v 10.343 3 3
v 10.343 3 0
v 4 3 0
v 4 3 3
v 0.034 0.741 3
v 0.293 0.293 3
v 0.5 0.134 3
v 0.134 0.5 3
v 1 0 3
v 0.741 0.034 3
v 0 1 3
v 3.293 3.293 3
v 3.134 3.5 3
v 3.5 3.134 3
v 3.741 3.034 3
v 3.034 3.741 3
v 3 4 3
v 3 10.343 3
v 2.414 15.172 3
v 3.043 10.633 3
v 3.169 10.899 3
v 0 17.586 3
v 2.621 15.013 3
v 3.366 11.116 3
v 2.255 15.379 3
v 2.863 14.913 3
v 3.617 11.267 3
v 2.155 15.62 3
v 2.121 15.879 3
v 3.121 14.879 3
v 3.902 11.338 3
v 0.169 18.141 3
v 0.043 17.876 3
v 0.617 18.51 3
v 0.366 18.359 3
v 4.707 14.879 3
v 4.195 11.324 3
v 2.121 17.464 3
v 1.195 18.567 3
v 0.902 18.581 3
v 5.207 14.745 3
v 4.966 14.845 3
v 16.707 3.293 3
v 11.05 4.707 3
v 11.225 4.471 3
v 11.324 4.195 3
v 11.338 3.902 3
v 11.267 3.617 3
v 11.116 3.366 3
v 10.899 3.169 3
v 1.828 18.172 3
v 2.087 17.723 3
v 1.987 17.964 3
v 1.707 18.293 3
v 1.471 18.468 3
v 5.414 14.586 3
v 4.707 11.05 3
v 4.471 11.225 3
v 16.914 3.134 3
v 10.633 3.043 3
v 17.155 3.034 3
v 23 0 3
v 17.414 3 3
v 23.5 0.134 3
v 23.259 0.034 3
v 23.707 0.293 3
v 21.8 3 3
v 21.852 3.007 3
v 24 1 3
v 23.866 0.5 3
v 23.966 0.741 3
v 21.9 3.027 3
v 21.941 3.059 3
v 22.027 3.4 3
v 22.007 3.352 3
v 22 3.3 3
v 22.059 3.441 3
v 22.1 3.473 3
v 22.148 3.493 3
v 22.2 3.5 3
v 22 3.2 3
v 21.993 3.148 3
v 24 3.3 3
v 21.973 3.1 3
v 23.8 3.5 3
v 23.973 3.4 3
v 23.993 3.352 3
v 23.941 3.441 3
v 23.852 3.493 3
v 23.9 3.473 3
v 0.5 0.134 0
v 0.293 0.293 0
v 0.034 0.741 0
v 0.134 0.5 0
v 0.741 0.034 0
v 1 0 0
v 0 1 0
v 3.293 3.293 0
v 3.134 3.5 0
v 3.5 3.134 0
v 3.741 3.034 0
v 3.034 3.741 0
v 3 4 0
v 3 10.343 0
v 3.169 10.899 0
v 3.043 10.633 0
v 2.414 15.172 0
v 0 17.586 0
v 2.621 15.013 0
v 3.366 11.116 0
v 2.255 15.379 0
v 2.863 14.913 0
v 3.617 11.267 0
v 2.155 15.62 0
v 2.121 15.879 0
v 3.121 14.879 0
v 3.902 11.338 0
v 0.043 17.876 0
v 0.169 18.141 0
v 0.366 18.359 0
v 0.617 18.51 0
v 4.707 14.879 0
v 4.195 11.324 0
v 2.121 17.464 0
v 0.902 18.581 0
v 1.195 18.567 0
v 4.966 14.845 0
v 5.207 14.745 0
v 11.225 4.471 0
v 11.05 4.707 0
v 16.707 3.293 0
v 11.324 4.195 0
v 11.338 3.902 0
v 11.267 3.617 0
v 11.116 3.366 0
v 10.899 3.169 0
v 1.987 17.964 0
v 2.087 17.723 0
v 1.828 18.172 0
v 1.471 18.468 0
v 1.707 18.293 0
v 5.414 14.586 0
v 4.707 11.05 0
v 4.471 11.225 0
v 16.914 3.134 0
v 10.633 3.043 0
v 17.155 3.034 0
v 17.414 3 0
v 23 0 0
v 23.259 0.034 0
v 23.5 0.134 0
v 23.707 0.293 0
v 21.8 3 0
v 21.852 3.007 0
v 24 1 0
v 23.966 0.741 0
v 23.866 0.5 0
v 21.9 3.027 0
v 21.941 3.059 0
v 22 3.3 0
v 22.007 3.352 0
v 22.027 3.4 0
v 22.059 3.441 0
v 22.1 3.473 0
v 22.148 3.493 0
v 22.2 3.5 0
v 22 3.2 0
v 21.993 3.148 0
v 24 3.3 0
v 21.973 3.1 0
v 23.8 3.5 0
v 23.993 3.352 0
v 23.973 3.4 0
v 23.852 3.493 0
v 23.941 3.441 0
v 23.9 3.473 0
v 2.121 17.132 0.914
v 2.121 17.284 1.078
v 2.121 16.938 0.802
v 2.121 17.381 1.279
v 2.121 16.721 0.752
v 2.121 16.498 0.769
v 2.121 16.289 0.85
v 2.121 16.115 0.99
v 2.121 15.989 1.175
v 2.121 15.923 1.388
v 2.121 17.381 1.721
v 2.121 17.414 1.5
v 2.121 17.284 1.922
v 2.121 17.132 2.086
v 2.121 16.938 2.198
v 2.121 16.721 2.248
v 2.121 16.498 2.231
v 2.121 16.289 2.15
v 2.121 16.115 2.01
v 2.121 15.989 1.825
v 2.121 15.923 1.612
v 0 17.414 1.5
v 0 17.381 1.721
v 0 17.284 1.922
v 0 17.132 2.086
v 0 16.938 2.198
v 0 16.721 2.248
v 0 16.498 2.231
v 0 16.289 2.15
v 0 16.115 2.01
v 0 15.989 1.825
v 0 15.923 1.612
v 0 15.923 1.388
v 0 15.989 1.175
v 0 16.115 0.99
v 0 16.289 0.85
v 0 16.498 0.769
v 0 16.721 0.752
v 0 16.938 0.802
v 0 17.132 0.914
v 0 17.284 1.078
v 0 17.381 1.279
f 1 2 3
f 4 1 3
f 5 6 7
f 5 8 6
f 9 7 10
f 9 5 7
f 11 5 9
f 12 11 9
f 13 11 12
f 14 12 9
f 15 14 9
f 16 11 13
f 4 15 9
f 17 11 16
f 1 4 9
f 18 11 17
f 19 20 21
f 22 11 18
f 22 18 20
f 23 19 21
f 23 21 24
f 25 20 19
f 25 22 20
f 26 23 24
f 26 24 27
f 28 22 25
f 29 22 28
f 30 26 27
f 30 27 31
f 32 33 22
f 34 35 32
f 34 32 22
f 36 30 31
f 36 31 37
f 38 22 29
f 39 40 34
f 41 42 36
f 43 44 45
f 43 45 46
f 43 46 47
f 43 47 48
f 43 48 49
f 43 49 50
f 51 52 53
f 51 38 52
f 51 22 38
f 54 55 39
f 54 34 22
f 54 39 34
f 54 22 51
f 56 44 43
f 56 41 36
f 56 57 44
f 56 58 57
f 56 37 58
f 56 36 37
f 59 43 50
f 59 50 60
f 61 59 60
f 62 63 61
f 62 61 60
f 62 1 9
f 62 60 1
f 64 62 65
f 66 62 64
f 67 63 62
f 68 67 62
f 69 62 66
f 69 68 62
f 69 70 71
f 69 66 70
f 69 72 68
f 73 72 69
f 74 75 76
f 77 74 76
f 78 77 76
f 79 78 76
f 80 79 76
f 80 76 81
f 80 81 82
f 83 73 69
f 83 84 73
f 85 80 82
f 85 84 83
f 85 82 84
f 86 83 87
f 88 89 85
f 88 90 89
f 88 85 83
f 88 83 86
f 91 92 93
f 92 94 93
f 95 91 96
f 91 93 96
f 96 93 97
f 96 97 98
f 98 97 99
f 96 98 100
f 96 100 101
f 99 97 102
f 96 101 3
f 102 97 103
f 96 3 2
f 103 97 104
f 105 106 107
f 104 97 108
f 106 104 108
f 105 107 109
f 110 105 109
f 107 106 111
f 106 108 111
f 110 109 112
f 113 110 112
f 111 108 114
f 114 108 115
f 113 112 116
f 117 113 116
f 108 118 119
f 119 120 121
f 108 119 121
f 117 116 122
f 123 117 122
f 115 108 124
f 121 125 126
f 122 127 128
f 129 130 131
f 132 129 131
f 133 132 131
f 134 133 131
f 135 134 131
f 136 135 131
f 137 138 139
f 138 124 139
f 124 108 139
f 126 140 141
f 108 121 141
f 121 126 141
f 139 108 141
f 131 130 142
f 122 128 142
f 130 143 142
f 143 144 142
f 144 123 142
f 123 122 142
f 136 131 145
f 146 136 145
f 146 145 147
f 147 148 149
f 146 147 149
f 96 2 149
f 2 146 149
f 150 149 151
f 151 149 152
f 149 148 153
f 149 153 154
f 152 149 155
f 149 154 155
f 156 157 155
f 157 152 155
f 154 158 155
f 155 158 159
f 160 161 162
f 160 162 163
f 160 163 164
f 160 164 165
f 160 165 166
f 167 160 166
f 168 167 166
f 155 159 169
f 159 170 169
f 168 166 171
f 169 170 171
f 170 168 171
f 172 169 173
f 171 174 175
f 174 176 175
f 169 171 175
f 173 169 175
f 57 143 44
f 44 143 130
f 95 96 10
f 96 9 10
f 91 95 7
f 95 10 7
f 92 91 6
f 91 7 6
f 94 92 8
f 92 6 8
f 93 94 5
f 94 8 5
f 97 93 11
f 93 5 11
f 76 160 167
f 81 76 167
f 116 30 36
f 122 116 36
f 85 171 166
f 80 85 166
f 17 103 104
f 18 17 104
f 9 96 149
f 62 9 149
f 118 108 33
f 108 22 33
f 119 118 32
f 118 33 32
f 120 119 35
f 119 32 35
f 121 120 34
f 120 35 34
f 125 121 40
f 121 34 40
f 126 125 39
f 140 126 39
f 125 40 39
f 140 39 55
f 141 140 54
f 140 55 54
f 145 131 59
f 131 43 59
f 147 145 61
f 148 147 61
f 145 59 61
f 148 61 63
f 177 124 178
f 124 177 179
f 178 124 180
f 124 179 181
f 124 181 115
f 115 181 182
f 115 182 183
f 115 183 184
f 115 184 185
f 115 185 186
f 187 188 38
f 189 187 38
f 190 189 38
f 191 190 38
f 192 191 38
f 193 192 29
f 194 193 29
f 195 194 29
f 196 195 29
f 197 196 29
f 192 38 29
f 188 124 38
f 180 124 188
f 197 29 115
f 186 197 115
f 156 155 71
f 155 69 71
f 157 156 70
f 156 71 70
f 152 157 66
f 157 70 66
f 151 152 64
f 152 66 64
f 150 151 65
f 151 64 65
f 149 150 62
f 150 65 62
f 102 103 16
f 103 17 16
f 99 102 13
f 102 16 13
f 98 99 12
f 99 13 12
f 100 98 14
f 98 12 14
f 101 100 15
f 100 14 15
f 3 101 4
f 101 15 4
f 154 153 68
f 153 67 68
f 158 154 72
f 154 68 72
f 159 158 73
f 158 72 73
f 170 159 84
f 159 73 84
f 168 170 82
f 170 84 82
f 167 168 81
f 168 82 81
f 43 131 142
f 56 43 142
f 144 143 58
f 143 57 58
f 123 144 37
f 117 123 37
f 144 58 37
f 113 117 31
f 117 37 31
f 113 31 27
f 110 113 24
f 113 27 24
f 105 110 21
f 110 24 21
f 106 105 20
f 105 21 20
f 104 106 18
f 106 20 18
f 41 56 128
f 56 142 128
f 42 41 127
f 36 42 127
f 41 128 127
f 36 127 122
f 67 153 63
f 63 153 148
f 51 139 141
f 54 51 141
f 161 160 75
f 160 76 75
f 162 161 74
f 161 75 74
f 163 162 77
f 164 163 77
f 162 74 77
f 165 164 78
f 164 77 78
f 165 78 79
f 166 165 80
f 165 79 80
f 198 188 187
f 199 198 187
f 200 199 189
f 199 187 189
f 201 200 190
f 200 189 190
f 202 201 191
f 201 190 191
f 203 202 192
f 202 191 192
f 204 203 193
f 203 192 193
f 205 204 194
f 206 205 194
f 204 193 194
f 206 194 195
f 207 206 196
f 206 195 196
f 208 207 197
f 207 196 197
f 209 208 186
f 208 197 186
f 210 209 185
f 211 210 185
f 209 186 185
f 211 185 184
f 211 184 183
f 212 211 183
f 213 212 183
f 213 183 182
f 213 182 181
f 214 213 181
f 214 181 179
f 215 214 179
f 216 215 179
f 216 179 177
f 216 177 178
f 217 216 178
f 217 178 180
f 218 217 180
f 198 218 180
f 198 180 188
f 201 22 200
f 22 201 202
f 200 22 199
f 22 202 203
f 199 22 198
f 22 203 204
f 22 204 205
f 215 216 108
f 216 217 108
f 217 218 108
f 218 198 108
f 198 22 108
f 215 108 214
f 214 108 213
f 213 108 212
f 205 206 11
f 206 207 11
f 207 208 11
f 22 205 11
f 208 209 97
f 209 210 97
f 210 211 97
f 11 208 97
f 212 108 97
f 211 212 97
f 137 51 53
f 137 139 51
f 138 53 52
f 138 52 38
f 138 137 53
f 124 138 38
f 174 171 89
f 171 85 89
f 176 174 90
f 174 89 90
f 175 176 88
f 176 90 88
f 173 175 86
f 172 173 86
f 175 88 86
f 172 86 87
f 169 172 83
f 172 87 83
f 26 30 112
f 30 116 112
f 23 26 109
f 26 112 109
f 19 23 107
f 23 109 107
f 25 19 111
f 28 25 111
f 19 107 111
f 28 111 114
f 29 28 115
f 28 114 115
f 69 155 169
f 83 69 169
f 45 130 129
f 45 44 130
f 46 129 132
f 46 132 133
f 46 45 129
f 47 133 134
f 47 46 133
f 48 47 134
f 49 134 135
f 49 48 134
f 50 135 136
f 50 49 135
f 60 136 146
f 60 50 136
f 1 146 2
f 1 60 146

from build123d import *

# Parameters (mm, degrees)
F1_DEPTH = 3
F3_DEPTH = 3.001
F4_R     = 1
F5_R     = 0.2
F6_R     = 0.75
F7_DEPTH = 2.1223203436


with BuildPart() as f1:
    # F0 (on Top) → F1 (new body)
    with BuildSketch(Plane.XY):
        Polygon((17, 3), (0, 20), (0, 0), (24, 0), (24, 3.5), (22, 3.5), (22, 3), align=None)
        Polygon((12.7573593129, 3), (3, 3), (3, 12.7573593129), align=None, mode=Mode.SUBTRACT)
    extrude(amount=F1_DEPTH)

    # F2 (on face) → F3 (cut, through all)
    with BuildSketch(Plane.XY.offset(3)):
        Polygon((5.1213203436, 17.8786796564), (2.1213203436, 17.8786796564), (5.1213203436, 14.8786796564), align=None)
        Polygon((5.1213203436, 14.8786796564), (2.1213203436, 17.8786796564), (2.1213203436, 14.8786796564), align=None)
    extrude(amount=-F3_DEPTH, mode=Mode.SUBTRACT)

    # F4
    f4_edges = [f1.edges().sort_by_distance(p)[0] for p in [
        (5.12132, 14.87868, 1.5),
        (2.12132, 14.87868, 1.5),
        (3, 12.757359, 1.5),
        (17, 3, 1.5),
        (3, 3, 1.5),
        (12.757359, 3, 1.5),
        (2.12132, 17.87868, 1.5),
        (24, 0, 1.5),
        (0, 20, 1.5),
        (0, 0, 1.5),
    ]]
    fillet(f4_edges, radius=F4_R)

    # F5
    f5_edges = [f1.edges().sort_by_distance(p)[0] for p in [
        (22, 3, 1.5),
        (24, 3.5, 1.5),
        (22, 3.5, 1.5),
    ]]
    fillet(f5_edges, radius=F5_R)

    # F6 (on face) → F7 (cut, through all)
    with BuildSketch(Plane.YZ.offset(2.1213203436)):
        with Locations((16.6644660941, 1.5)):
            Circle(F6_R)
    extrude(amount=-F7_DEPTH, mode=Mode.SUBTRACT)


solid = f1.part
